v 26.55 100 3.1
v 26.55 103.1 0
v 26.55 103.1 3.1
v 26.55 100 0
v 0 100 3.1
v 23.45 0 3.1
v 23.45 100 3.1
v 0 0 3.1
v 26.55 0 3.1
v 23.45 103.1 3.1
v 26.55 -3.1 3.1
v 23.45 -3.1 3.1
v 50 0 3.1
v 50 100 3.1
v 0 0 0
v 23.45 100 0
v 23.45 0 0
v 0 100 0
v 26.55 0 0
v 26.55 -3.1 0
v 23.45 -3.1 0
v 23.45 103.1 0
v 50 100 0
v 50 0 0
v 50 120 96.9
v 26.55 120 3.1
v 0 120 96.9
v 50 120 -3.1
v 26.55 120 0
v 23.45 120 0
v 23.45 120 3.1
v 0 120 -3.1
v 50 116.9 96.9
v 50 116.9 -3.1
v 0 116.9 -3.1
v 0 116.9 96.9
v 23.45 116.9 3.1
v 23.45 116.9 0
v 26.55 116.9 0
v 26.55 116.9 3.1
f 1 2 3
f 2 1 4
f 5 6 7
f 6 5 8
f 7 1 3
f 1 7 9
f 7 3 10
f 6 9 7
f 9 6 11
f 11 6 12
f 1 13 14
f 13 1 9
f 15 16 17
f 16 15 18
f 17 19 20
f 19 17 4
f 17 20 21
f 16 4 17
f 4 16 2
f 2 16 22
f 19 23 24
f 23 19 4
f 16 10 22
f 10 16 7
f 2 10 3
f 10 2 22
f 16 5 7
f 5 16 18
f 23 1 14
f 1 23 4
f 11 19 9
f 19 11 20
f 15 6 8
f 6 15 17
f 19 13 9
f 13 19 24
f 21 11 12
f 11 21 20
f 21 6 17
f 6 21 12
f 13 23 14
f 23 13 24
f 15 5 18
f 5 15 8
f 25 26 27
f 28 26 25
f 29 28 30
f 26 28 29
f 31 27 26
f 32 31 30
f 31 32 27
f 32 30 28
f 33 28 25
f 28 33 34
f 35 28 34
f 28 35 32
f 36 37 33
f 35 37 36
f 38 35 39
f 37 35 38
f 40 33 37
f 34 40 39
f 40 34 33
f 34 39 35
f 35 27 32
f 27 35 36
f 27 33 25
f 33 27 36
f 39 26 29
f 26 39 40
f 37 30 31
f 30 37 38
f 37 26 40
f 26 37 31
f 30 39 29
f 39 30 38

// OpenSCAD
include <../lasercut.scad>; 

thickness = 3.1;
x = 50;
y = 100;
lasercutoutSquare(thickness=thickness, x=x, y=y,
    simple_tabs=[
            [UP, x/2, y],
            [DOWN, x/2, 0]
        ]
    );
    
translate([0,y+20,-thickness]) rotate([90,0,0]) 
    lasercutoutSquare(thickness=thickness, x=x, y=y,
        simple_tab_holes=[
                [MID, x/2-thickness/2, thickness]
            ]
    );
